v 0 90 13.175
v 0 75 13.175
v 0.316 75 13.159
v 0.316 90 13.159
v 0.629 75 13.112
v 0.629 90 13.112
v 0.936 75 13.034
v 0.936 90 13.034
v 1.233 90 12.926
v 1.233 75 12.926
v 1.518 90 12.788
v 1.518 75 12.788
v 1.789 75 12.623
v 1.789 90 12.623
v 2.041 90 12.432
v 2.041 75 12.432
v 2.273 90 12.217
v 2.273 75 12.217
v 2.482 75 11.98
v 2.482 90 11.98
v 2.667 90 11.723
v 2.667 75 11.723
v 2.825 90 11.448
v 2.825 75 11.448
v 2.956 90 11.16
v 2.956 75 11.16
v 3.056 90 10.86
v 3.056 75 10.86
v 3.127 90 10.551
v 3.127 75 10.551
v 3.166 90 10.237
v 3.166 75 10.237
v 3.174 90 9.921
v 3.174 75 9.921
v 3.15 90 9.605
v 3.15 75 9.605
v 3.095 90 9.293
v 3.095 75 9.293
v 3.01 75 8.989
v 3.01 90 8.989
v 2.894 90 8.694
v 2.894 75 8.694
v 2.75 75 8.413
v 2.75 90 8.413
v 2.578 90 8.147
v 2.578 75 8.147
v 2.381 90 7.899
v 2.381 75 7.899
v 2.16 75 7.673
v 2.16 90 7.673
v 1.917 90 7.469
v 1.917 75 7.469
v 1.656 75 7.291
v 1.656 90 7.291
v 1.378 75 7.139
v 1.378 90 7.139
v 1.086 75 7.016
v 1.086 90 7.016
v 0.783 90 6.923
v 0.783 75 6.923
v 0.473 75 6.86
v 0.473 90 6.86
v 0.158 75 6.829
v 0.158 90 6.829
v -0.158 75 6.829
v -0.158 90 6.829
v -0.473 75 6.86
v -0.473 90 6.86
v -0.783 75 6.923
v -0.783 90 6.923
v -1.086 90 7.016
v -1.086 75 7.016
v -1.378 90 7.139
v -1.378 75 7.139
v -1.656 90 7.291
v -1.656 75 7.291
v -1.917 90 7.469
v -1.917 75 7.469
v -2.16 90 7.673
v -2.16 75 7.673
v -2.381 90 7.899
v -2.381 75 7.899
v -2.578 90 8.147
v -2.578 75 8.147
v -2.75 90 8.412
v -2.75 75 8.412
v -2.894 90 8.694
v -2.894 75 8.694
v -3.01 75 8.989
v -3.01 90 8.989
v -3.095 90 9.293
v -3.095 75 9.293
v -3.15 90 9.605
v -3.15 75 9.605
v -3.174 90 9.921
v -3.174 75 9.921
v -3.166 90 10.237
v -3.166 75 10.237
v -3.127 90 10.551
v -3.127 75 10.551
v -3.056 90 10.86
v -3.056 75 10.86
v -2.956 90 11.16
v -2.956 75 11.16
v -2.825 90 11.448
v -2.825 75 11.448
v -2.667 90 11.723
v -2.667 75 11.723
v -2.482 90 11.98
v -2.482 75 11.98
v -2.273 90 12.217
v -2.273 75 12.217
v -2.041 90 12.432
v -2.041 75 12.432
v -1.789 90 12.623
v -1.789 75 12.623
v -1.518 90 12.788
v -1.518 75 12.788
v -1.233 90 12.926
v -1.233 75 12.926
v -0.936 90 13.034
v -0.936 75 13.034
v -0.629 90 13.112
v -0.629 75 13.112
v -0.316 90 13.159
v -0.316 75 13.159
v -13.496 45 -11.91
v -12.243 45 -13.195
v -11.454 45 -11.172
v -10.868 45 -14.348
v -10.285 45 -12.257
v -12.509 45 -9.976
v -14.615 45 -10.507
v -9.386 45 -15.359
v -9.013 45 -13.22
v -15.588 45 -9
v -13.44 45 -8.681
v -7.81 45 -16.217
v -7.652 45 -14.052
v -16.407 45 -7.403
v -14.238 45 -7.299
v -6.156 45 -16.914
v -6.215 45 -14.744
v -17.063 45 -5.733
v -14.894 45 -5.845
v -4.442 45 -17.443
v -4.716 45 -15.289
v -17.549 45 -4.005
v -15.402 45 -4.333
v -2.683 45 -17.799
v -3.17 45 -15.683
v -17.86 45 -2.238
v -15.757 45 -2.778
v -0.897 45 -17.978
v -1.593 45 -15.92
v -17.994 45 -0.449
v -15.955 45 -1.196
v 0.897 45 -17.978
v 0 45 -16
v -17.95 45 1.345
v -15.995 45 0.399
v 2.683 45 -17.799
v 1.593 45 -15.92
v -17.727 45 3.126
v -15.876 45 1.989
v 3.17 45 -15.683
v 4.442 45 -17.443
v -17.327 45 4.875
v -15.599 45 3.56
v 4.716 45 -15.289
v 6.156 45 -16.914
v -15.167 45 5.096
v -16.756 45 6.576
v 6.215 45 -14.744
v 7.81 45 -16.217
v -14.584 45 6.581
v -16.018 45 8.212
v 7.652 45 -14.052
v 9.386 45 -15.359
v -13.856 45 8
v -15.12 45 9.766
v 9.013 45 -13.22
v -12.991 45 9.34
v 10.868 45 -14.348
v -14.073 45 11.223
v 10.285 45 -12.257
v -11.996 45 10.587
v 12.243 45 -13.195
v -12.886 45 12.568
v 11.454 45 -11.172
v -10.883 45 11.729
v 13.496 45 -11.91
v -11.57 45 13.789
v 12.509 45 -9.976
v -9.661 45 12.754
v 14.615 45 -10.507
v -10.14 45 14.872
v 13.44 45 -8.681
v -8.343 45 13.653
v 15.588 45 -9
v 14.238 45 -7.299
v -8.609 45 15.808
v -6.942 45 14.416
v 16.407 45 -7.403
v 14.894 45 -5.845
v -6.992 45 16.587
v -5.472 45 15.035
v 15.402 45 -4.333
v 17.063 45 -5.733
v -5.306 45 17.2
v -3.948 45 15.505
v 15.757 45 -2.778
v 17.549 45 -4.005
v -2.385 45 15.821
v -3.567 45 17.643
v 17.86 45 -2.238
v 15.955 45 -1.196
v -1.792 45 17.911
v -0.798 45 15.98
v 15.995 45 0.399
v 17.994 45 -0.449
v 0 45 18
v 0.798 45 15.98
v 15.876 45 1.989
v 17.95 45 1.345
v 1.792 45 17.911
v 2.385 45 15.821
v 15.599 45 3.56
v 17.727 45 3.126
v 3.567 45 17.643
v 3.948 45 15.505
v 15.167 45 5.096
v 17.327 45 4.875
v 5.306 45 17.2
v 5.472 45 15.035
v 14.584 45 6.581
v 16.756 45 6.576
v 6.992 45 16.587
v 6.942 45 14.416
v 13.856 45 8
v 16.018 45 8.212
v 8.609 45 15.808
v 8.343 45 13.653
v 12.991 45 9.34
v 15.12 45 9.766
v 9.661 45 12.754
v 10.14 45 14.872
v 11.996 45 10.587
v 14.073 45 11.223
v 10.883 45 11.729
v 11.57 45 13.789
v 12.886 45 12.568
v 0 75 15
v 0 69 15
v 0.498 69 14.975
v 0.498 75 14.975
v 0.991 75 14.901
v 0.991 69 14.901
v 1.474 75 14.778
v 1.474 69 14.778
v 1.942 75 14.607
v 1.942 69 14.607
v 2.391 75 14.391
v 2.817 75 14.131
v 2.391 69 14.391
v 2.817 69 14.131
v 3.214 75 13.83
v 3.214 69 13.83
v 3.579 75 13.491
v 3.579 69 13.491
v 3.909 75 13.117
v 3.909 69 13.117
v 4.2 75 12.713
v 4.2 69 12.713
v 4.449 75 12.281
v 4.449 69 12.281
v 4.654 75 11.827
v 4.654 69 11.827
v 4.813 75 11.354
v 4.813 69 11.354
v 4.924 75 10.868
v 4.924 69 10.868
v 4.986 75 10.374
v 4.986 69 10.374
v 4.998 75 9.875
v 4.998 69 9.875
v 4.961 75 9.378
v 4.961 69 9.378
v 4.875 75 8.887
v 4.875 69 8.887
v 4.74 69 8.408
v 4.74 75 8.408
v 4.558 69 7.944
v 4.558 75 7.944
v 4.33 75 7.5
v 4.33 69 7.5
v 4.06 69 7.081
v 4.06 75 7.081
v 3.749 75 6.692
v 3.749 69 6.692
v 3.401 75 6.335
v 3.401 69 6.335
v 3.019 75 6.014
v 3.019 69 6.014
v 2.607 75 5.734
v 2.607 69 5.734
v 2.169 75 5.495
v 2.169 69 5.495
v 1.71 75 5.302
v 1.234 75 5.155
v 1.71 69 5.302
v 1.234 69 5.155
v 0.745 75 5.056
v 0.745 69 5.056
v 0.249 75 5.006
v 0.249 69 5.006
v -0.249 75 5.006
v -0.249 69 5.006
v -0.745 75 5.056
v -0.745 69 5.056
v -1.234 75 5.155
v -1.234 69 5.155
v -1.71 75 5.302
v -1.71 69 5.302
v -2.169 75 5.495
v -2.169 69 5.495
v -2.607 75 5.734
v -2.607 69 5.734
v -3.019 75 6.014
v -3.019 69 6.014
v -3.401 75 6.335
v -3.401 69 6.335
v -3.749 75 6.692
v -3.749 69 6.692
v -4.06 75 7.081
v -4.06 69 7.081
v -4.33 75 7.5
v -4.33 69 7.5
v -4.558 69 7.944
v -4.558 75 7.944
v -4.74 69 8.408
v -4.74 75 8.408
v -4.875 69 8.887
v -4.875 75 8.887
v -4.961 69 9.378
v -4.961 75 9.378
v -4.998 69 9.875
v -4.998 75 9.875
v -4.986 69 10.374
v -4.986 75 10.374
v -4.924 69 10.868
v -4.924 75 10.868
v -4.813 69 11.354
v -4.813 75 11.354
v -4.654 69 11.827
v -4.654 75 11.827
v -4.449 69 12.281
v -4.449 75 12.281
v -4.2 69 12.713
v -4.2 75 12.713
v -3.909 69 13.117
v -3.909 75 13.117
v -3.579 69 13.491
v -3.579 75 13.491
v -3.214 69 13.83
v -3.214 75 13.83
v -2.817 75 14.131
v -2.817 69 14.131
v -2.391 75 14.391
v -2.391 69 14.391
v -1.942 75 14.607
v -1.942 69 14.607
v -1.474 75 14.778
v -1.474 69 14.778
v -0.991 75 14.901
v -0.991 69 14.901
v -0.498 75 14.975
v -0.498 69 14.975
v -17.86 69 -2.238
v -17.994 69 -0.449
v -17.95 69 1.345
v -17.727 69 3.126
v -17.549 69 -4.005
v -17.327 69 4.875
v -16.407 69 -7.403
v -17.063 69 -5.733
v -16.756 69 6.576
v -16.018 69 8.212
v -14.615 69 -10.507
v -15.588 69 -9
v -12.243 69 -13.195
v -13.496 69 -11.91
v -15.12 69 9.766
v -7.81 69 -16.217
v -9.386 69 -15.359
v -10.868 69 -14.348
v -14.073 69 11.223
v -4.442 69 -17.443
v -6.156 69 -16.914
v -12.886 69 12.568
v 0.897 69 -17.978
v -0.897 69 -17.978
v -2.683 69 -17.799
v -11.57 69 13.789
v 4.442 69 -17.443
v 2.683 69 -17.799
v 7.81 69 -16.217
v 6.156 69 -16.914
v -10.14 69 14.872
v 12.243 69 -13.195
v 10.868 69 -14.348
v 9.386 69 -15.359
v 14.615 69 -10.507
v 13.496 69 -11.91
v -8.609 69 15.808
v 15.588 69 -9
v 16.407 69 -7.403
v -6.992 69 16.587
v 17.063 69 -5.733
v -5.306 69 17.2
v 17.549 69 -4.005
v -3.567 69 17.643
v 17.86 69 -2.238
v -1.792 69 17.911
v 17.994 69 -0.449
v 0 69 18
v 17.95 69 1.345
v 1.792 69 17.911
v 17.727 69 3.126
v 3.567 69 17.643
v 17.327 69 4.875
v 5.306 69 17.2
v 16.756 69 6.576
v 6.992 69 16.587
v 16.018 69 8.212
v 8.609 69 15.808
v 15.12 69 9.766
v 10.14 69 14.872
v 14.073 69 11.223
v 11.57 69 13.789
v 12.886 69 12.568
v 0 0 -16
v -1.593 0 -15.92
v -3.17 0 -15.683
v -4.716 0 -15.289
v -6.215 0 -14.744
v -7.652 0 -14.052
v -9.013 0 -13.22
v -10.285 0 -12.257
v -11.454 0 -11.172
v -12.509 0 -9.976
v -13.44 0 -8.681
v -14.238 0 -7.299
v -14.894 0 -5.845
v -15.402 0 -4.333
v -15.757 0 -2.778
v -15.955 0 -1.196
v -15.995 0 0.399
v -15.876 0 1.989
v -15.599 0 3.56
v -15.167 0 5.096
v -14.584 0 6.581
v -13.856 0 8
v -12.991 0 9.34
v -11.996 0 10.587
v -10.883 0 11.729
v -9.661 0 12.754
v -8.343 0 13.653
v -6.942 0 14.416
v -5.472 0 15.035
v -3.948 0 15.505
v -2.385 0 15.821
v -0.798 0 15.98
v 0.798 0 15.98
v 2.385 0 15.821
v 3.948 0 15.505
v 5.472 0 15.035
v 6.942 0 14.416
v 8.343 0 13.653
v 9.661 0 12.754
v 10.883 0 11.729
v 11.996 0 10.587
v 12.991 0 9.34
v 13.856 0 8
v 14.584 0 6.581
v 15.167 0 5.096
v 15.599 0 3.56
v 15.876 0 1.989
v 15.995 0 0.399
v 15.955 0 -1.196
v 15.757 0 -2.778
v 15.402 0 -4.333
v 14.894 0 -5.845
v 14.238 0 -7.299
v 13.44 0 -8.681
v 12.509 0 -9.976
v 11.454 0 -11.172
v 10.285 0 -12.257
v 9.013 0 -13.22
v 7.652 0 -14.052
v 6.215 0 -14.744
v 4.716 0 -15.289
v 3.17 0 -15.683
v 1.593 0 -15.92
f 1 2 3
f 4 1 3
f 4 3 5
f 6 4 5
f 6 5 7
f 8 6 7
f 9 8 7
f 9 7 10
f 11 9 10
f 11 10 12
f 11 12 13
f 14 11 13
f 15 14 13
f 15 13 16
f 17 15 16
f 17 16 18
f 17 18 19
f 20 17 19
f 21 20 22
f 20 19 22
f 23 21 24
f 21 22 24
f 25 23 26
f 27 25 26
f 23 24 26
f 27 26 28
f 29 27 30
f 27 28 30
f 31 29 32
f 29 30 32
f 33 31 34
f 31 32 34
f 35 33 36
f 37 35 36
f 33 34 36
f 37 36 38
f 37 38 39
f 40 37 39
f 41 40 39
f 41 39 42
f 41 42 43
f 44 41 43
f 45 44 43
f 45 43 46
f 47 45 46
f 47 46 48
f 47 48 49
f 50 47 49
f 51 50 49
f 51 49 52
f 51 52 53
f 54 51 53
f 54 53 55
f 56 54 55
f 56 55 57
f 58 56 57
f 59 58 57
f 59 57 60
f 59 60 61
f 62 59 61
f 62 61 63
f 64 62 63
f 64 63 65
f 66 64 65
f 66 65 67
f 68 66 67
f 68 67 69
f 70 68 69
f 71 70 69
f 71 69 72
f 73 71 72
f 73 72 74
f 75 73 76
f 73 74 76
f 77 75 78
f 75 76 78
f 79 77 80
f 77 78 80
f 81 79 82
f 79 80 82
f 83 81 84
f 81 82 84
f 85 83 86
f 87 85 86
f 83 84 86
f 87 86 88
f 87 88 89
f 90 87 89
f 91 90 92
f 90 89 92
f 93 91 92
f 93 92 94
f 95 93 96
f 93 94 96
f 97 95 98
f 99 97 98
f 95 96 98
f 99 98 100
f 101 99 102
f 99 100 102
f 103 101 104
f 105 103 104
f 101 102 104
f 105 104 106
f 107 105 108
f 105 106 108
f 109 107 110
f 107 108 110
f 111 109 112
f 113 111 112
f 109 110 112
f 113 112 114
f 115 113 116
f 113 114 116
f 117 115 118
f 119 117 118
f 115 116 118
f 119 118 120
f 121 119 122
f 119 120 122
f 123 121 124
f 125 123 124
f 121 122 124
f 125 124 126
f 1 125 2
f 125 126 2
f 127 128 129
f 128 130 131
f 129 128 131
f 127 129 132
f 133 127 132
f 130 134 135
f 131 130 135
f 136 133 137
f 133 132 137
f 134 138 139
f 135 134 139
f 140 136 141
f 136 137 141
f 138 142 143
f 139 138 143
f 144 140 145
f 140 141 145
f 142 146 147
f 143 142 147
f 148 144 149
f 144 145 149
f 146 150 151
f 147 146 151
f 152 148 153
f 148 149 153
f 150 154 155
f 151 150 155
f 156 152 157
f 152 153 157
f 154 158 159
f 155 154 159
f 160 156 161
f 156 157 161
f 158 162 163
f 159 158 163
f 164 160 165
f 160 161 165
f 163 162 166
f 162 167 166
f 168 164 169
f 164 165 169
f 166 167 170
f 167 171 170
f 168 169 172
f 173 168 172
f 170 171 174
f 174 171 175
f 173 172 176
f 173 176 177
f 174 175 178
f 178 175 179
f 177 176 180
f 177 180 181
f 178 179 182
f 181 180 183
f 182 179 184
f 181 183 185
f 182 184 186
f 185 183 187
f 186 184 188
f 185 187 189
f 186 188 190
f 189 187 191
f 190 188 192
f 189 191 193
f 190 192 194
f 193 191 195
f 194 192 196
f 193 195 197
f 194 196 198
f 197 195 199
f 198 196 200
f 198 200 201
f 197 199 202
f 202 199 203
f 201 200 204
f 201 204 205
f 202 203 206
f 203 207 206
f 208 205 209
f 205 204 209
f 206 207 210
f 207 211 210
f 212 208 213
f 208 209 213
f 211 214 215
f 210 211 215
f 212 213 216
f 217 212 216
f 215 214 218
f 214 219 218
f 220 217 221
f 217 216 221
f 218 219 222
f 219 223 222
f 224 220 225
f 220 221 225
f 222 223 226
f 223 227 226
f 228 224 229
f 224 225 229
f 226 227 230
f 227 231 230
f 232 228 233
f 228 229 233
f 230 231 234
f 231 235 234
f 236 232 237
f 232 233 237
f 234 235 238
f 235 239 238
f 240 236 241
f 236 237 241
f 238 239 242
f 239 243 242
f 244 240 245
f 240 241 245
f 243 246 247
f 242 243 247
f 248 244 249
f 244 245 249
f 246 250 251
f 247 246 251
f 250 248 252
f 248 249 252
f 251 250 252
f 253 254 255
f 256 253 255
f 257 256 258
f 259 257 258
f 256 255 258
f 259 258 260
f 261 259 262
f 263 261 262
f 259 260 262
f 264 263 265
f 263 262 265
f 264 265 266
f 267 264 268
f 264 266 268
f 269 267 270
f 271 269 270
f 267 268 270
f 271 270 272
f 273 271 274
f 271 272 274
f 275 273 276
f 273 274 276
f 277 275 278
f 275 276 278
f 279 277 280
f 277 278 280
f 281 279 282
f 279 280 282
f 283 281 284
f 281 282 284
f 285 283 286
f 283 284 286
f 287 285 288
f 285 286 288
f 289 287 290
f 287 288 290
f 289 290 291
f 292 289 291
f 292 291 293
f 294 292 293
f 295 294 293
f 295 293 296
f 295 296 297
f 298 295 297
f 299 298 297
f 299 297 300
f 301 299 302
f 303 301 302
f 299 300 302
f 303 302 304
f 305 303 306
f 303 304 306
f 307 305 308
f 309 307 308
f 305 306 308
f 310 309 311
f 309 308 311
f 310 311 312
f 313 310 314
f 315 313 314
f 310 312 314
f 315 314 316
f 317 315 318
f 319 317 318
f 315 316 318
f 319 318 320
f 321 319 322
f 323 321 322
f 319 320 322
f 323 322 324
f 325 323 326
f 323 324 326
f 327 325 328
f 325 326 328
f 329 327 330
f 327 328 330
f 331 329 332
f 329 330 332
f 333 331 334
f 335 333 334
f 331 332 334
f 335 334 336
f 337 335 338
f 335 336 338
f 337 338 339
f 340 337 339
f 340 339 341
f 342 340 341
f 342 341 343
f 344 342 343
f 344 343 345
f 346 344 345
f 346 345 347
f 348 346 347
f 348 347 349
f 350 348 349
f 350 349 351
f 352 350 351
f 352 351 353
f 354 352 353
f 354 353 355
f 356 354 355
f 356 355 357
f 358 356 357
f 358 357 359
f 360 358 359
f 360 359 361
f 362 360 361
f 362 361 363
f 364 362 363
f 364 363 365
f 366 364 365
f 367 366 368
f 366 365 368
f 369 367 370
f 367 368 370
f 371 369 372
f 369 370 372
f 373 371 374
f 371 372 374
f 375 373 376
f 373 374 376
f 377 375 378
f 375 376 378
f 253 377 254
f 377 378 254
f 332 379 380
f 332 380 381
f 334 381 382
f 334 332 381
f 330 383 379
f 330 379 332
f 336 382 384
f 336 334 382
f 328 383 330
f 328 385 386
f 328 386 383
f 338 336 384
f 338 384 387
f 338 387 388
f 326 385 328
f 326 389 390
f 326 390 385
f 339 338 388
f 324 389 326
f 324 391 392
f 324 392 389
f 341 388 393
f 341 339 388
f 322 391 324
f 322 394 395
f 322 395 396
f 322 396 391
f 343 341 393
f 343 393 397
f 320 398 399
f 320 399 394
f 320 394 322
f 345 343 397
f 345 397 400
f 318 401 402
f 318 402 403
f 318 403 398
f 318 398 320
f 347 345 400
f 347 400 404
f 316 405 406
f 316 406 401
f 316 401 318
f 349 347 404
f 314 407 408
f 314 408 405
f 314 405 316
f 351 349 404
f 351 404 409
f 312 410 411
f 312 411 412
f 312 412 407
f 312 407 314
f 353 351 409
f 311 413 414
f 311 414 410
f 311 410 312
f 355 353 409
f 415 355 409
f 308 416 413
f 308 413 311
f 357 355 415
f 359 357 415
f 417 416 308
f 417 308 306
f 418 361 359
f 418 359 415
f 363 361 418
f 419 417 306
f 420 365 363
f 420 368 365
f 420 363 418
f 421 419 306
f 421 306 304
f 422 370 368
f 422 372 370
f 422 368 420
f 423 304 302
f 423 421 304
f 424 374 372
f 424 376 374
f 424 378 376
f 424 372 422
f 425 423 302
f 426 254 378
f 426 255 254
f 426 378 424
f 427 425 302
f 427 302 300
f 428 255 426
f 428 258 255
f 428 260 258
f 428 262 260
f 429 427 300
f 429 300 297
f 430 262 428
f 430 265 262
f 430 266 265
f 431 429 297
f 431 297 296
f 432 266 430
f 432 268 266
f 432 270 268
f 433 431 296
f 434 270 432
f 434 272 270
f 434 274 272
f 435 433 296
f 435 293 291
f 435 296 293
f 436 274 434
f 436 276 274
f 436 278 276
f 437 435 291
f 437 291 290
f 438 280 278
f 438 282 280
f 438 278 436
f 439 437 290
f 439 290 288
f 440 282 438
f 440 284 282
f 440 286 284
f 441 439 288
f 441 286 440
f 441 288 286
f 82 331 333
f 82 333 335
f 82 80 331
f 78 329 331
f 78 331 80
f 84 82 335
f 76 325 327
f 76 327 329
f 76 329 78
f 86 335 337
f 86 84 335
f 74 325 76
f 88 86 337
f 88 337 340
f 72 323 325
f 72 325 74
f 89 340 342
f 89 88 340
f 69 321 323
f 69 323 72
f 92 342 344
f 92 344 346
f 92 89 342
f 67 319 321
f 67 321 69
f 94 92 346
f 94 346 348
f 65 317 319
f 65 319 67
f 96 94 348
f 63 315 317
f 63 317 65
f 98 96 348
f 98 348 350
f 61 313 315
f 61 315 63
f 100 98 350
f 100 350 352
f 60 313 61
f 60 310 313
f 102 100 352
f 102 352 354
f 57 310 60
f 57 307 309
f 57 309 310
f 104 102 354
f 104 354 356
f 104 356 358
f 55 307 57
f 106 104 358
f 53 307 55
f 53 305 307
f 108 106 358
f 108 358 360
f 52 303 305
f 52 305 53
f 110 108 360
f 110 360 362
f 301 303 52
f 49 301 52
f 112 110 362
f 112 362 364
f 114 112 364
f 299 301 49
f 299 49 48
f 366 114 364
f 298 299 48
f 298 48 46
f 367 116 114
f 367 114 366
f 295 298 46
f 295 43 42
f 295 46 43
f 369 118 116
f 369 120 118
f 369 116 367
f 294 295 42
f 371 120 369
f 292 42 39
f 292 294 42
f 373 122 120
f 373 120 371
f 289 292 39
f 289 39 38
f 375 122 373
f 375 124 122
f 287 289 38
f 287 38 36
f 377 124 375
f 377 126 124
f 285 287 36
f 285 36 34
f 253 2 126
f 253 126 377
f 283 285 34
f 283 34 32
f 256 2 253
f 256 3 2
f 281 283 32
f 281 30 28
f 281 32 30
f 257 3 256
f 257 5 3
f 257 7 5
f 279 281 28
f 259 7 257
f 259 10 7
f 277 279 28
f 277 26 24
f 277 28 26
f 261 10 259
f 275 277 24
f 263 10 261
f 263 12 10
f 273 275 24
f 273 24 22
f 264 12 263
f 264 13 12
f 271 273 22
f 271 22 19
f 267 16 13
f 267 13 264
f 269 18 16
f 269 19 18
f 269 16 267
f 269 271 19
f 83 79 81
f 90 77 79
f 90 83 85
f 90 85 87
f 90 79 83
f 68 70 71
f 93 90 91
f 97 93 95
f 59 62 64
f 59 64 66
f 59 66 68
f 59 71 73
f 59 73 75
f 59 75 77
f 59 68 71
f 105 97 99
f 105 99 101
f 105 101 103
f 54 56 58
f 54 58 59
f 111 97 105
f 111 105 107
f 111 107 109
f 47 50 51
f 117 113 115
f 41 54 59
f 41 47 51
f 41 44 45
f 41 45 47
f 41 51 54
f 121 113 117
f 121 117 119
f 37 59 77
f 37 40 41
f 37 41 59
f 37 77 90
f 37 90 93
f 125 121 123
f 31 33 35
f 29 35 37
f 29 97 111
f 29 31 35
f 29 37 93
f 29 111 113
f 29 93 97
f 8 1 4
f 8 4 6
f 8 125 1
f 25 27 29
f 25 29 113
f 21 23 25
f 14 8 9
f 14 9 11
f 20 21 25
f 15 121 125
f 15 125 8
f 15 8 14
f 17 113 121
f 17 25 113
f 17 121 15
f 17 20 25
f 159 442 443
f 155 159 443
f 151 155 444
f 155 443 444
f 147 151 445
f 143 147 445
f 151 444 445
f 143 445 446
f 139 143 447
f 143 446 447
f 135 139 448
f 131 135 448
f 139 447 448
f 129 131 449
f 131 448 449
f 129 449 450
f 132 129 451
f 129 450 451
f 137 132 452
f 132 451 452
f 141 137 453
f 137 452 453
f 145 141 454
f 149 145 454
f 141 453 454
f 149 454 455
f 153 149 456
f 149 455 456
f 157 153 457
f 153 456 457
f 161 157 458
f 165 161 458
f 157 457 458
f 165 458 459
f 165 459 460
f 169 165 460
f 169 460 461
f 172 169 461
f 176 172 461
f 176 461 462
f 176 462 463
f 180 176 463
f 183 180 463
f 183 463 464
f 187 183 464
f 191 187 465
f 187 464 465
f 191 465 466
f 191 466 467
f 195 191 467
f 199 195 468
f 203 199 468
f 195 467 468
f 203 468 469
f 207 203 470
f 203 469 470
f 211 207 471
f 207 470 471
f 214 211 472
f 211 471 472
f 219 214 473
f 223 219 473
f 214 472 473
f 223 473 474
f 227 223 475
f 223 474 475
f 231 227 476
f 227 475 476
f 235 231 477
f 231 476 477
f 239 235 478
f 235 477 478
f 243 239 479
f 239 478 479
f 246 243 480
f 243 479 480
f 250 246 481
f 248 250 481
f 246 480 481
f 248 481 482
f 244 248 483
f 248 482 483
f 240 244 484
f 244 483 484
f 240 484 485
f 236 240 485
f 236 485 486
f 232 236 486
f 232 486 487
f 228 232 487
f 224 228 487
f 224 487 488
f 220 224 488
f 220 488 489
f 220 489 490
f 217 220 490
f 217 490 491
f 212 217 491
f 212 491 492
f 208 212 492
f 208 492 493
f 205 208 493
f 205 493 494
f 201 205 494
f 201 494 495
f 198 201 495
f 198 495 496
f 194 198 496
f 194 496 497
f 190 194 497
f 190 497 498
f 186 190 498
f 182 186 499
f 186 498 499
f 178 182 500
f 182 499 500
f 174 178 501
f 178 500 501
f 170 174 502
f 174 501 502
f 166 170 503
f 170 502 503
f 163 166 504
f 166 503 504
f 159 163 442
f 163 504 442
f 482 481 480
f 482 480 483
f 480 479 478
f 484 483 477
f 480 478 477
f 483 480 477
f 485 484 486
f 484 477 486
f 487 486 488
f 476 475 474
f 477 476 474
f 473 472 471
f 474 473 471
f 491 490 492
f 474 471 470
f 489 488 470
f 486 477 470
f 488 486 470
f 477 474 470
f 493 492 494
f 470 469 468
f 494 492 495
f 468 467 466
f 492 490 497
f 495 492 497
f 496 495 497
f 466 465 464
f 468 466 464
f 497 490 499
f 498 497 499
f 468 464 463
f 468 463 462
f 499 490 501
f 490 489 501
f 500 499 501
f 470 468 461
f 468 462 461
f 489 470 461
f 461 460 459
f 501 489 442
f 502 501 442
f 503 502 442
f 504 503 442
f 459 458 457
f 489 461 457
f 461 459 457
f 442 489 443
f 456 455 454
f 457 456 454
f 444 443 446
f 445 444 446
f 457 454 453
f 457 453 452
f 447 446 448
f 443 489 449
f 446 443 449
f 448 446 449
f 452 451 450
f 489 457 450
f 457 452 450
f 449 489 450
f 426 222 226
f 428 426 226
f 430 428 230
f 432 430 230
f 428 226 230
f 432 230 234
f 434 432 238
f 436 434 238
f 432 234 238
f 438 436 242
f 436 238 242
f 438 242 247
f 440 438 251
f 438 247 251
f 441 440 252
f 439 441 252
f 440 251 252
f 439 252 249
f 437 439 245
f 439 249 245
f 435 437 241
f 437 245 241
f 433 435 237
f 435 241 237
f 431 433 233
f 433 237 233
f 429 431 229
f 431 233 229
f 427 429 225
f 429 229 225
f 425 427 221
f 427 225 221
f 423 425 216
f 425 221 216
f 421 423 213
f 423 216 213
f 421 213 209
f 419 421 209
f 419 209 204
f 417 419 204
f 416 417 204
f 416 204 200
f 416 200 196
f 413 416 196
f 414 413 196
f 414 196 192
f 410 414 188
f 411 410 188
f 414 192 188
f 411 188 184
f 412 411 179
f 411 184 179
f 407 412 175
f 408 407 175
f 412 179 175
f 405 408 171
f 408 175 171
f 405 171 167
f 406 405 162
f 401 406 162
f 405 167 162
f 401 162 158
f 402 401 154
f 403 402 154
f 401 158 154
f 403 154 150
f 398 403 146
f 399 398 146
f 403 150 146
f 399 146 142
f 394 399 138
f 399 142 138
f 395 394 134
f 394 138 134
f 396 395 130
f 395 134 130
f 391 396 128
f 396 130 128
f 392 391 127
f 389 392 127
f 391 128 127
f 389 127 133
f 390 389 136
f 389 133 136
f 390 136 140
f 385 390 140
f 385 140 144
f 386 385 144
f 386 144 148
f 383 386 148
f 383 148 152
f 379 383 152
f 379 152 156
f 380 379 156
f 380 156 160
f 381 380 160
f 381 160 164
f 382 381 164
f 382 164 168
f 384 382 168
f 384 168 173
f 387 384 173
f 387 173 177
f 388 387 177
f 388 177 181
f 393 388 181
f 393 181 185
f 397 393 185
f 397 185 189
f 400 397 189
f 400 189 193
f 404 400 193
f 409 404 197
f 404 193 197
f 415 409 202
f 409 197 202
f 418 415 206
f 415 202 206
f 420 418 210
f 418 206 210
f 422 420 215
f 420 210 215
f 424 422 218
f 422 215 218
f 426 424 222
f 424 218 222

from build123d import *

# Parameters (mm, degrees)
SKETCH2_R                = 16
BOSS_EXTRUDE1_DEPTH      = 45
SKETCH3_R                = 18
BOSS_EXTRUDE2_DEPTH      = 24
SKETCH4_R                = 5
SKETCH4_R_2              = 3.175
BOSS_EXTRUDE3_DEPTH      = 6
BOSS_EXTRUDE4_DEPTH      = 15
BOSS_EXTRUDE4_DEPTH_BACK = 13.62
SKETCH5_R                = 3.175


with BuildPart() as part:
    # Sketch2 → Boss-Extrude1 (new body)
    with BuildSketch(Plane(origin=(0, 0, 0), x_dir=(1, 0, 0), z_dir=(0, 1, 0))):
        with Locations(Location((0, 0, 0), (0, 0, 90))):
            Circle(SKETCH2_R)
    extrude(amount=BOSS_EXTRUDE1_DEPTH)

    # Sketch3 → Boss-Extrude2 (add)
    with BuildSketch(Plane(origin=(0, 45, 0), x_dir=(1, 0, 0), z_dir=(0, 1, 0))):
        with Locations(Location((0, 0, 0), (0, 0, 270))):
            Circle(SKETCH3_R)
    extrude(amount=BOSS_EXTRUDE2_DEPTH)

    # Sketch4 → Boss-Extrude3 (add)
    with BuildSketch(Plane(origin=(0, 69, 0), x_dir=(1, 0, 0), z_dir=(0, 1, 0))):
        with Locations(Location((0, -10, 0), (0, 0, 270))):
            Circle(SKETCH4_R)
        with Locations(Location((0, -10, 0), (0, 0, 270))):
            Circle(SKETCH4_R_2, mode=Mode.SUBTRACT)
    extrude(amount=BOSS_EXTRUDE3_DEPTH)

    # Sketch5 → Boss-Extrude4 (add, two sides: drawn at the far end of the back side and taken through both)
    with BuildSketch(Plane(origin=(0, 75, 0), x_dir=(1, 0, 0), z_dir=(0, 1, 0)).offset(-BOSS_EXTRUDE4_DEPTH_BACK)):
        with Locations(Location((0, -10, 0), (0, 0, 270))):
            Circle(SKETCH5_R)
    extrude(amount=BOSS_EXTRUDE4_DEPTH + BOSS_EXTRUDE4_DEPTH_BACK)


solid = part.part
